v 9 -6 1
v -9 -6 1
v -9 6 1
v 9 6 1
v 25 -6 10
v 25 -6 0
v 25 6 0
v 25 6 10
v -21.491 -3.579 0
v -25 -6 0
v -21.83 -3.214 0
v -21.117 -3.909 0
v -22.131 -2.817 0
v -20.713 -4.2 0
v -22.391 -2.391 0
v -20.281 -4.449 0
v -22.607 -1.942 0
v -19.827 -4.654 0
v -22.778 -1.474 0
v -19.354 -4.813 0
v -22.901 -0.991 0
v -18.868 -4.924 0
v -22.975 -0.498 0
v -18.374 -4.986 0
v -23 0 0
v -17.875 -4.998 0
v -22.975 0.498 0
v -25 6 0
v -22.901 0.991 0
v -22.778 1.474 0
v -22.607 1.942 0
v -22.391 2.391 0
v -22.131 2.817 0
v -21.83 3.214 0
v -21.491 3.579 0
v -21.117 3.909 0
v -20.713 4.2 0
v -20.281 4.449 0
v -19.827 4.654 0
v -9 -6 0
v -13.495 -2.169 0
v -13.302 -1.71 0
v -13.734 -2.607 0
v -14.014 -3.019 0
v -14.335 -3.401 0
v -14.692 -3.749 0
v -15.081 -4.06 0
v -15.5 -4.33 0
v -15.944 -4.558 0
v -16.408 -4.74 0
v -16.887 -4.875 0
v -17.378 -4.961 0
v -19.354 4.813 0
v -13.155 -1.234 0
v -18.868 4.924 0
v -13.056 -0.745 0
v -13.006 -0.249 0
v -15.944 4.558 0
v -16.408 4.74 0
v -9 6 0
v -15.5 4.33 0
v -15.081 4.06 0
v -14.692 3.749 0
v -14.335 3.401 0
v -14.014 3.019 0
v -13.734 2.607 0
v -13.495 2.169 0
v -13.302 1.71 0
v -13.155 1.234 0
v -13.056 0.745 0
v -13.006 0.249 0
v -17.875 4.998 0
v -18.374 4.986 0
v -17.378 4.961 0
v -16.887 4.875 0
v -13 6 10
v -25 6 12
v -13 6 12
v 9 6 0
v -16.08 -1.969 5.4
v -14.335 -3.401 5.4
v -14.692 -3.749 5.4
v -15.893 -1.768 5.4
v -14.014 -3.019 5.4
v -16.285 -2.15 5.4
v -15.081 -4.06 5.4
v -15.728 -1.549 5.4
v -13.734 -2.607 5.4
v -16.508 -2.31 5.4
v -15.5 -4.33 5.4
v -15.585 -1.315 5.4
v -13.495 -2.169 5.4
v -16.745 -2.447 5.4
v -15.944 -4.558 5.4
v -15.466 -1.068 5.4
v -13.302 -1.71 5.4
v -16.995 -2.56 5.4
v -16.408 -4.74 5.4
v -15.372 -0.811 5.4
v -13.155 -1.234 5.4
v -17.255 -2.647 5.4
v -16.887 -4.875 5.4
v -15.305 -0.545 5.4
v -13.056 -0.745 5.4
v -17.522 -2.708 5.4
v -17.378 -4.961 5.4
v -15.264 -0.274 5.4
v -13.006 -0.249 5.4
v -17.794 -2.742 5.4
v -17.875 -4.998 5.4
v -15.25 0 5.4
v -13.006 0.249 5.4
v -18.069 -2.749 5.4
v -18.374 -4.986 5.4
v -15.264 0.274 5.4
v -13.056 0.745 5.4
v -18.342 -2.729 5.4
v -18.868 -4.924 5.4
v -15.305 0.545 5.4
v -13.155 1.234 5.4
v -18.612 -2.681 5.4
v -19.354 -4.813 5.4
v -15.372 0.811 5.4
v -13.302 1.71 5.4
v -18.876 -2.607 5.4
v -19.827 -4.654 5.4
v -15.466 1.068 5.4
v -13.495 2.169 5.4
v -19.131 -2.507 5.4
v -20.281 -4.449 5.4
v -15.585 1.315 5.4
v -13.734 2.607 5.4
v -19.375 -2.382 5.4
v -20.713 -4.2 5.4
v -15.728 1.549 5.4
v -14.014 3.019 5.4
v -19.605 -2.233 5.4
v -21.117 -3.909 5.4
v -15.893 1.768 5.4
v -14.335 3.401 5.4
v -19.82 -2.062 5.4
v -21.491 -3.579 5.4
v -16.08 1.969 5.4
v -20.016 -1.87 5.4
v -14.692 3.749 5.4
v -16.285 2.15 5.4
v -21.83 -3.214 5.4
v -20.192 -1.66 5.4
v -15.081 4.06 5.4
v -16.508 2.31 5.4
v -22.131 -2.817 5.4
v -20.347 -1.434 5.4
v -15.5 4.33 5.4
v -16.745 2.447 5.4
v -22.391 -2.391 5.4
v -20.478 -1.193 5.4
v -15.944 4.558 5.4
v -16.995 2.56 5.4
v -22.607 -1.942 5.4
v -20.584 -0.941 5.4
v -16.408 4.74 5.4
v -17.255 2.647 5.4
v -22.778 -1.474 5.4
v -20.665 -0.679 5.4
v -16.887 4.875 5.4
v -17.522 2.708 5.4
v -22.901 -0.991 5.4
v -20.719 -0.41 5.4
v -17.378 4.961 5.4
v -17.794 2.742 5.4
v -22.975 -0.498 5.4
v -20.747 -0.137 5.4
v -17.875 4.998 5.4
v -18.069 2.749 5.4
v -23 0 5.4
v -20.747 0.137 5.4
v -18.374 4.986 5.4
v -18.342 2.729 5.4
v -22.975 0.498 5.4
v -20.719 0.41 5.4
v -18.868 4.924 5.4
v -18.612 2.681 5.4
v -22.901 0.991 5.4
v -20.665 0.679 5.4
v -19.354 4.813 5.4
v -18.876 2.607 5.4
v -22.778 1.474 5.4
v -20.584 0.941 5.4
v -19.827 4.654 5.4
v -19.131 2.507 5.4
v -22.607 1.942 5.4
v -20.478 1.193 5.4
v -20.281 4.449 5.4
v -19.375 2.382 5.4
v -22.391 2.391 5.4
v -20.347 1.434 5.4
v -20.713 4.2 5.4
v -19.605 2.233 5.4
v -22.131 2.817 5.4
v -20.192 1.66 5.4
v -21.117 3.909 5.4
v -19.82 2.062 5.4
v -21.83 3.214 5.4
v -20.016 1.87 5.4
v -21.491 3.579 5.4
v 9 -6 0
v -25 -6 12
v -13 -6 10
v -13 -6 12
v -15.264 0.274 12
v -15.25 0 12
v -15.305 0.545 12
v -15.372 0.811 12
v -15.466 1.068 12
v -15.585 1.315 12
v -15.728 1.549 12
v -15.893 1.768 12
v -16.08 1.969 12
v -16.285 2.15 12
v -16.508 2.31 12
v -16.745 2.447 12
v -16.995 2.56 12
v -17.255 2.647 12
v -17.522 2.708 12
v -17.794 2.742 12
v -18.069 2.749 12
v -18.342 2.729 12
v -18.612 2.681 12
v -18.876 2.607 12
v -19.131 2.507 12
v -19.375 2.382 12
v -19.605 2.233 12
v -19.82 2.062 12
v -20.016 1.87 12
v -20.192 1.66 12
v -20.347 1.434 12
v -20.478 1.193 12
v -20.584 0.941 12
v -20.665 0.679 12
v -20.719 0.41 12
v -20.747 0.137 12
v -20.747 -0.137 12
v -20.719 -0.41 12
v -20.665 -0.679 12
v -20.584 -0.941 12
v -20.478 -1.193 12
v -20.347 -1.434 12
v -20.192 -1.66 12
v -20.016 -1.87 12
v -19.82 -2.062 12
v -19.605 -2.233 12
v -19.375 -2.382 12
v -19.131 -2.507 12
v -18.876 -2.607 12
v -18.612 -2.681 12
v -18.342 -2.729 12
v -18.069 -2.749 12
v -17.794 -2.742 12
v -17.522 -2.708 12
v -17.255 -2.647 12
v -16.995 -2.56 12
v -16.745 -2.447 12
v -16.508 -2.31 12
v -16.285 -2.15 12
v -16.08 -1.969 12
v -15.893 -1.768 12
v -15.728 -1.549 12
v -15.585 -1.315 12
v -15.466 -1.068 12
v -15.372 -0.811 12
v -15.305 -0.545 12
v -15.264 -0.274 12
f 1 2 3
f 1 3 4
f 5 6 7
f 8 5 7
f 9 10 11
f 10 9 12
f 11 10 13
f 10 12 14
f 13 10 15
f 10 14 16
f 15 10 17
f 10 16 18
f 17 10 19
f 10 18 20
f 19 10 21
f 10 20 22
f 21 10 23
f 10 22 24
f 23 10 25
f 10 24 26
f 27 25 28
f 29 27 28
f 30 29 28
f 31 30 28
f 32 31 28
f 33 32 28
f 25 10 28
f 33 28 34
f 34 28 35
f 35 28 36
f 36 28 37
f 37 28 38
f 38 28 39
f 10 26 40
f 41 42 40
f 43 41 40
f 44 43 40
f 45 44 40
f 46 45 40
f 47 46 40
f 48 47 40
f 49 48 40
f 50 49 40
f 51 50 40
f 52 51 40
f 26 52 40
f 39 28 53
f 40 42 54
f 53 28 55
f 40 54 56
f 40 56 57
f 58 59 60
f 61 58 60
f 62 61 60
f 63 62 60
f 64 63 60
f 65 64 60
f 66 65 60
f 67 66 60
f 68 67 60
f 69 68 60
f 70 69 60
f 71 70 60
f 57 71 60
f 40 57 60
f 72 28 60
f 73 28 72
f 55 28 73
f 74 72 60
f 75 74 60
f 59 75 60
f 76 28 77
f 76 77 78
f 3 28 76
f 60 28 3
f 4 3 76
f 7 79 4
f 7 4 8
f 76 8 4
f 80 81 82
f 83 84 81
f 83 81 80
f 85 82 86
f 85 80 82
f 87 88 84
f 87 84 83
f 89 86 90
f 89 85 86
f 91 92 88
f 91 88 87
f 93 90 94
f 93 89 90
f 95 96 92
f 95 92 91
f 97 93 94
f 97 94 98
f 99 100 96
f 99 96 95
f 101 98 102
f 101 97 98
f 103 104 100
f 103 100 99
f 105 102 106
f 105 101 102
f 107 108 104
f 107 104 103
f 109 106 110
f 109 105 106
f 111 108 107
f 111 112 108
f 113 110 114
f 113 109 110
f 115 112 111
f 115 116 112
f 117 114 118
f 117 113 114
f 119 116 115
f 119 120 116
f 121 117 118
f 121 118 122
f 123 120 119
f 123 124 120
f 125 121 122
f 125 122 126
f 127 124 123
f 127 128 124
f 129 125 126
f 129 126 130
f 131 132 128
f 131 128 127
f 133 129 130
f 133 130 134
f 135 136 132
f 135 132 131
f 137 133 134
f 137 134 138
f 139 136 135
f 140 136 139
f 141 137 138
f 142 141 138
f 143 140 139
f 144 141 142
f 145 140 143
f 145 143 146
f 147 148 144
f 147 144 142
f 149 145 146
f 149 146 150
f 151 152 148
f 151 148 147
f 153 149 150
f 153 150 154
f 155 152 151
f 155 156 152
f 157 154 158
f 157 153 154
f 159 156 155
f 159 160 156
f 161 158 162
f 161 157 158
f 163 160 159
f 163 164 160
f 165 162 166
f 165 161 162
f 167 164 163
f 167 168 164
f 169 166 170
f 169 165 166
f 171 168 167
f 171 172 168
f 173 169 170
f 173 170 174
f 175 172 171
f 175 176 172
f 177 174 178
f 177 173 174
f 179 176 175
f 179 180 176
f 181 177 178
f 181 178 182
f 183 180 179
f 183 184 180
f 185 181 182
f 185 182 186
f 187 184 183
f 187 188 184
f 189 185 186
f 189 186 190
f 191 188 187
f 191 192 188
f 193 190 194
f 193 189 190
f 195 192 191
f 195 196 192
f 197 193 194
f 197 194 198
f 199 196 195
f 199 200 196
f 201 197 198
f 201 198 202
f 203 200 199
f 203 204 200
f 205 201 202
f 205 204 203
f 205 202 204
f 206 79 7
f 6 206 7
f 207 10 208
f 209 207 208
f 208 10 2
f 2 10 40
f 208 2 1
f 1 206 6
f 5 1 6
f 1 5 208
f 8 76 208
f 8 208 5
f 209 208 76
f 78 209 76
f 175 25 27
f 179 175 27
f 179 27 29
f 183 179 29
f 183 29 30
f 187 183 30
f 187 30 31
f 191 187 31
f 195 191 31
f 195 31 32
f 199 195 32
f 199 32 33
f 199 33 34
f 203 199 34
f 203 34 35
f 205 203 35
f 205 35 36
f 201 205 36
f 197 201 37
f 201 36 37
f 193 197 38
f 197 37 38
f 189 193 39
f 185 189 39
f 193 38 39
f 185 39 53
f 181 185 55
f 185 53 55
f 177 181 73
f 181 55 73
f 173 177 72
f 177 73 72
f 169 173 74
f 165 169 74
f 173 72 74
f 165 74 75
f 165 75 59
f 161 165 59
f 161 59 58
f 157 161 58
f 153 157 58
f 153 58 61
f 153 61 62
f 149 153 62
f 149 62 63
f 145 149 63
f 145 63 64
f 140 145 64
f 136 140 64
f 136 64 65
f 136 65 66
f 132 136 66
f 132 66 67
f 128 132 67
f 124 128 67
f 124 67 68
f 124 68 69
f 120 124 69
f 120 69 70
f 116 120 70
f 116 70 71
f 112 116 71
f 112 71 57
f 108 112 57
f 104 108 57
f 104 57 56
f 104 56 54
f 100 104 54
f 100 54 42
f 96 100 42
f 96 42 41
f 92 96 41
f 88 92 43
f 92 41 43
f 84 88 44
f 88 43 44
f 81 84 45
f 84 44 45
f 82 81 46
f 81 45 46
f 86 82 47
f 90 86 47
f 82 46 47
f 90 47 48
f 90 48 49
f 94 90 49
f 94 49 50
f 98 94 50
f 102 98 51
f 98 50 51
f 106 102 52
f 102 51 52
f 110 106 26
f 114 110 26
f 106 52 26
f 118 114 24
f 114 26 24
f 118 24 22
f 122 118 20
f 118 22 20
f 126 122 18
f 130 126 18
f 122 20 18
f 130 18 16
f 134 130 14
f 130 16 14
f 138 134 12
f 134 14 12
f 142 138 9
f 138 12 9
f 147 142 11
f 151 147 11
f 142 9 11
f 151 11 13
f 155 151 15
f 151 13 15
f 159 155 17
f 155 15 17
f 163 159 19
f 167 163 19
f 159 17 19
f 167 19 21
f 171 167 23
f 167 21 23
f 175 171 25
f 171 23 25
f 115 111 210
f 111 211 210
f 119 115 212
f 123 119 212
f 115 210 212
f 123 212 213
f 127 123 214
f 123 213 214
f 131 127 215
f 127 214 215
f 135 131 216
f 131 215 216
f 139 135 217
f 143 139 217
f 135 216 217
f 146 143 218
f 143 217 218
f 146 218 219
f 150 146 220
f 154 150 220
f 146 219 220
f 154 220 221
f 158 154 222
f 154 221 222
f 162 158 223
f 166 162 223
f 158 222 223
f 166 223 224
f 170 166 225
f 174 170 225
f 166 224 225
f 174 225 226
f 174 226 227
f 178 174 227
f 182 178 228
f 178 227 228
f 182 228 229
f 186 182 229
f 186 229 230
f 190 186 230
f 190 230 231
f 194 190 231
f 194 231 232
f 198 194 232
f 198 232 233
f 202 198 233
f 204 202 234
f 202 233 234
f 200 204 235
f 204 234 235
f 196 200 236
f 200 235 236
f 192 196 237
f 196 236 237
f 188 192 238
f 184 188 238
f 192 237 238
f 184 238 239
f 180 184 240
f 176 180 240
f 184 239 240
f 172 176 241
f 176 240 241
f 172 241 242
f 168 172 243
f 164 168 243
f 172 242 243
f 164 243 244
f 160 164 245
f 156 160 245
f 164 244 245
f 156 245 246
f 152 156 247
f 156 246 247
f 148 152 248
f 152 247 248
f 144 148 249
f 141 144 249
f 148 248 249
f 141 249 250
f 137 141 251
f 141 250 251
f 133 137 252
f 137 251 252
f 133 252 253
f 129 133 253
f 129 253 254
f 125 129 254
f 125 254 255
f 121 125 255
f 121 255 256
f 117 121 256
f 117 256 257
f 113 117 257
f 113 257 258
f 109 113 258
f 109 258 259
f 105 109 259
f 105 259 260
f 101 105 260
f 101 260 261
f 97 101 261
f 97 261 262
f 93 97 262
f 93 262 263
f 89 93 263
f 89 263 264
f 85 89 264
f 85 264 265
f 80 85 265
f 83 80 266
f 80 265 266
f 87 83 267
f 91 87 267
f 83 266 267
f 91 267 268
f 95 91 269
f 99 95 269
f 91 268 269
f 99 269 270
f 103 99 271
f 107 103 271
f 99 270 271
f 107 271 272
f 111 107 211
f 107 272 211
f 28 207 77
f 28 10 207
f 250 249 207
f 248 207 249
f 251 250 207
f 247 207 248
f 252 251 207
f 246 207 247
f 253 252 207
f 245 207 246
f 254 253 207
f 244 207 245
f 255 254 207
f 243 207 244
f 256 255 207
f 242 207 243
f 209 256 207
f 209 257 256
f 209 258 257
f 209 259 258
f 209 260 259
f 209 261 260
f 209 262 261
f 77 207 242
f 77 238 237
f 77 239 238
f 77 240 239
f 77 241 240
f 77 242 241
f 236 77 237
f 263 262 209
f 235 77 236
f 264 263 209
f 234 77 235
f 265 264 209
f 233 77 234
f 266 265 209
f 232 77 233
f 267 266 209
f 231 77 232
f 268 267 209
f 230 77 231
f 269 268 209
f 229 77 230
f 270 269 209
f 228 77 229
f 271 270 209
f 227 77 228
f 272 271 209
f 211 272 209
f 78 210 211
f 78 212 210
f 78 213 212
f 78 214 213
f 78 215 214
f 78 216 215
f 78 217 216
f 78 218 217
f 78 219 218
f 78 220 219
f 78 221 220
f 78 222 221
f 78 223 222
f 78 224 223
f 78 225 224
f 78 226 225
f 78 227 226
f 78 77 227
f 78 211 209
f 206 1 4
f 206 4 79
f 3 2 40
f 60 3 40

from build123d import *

# Parameters (mm, degrees)
ESQUISSE1_W                                        = 50
ESQUISSE1_H                                        = 12
BOSS_EXTRU_1_DEPTH                                 = 10
ESQUISSE3_W                                        = 12
ESQUISSE3_H                                        = 12
BOSS_EXTRU_2_DEPTH                                 = 2
ENL_V_MAT_EXTRU_3_DEPTH                            = 29.372521918
ENL_V_MAT_EXTRU_3_DEPTH_BACK                       = 29.372521918
ESQUISSE4_W                                        = 18
ESQUISSE4_H                                        = 3.498401272
CHAMBRAGE_POUR_VIS_T_TE_HEXAGONALE_M52_D           = 5.5
CHAMBRAGE_POUR_VIS_T_TE_HEXAGONALE_M52_CBORE_D     = 10
CHAMBRAGE_POUR_VIS_T_TE_HEXAGONALE_M52_CBORE_DEPTH = 5.4


with BuildPart() as part:
    # Esquisse1 → Boss.-Extru.1 (new body)
    with BuildSketch(Plane.XY):
        Rectangle(ESQUISSE1_W, ESQUISSE1_H)
    extrude(amount=BOSS_EXTRU_1_DEPTH)

    # Esquisse3 → Boss.-Extru.2 (add)
    with BuildSketch(Plane.XY.offset(10)):
        with Locations((-19, 0)):
            Rectangle(ESQUISSE3_W, ESQUISSE3_H)
    extrude(amount=BOSS_EXTRU_2_DEPTH)

    # Esquisse4 → Enlèv. mat.-Extru.3 (cut, two sides: drawn at the far end of the back side and taken through both)
    with BuildSketch(Plane(origin=(0, 0, 0), x_dir=(1, 0, 0), z_dir=(0, 1, 0)).offset(-ENL_V_MAT_EXTRU_3_DEPTH_BACK)):
        with Locations((0, 0.749200636)):
            Rectangle(ESQUISSE4_W, ESQUISSE4_H)
    extrude(amount=ENL_V_MAT_EXTRU_3_DEPTH + ENL_V_MAT_EXTRU_3_DEPTH_BACK, mode=Mode.SUBTRACT)

    # Chambrage pour vis à tête hexagonale M52 (through all)
    with Locations(Plane(origin=(0, 0, 0), x_dir=(-1, 0, 0), z_dir=(0, 0, -1))):
        with Locations((18, 0)):
            CounterBoreHole(CHAMBRAGE_POUR_VIS_T_TE_HEXAGONALE_M52_D / 2, CHAMBRAGE_POUR_VIS_T_TE_HEXAGONALE_M52_CBORE_D / 2, CHAMBRAGE_POUR_VIS_T_TE_HEXAGONALE_M52_CBORE_DEPTH)


solid = part.part
